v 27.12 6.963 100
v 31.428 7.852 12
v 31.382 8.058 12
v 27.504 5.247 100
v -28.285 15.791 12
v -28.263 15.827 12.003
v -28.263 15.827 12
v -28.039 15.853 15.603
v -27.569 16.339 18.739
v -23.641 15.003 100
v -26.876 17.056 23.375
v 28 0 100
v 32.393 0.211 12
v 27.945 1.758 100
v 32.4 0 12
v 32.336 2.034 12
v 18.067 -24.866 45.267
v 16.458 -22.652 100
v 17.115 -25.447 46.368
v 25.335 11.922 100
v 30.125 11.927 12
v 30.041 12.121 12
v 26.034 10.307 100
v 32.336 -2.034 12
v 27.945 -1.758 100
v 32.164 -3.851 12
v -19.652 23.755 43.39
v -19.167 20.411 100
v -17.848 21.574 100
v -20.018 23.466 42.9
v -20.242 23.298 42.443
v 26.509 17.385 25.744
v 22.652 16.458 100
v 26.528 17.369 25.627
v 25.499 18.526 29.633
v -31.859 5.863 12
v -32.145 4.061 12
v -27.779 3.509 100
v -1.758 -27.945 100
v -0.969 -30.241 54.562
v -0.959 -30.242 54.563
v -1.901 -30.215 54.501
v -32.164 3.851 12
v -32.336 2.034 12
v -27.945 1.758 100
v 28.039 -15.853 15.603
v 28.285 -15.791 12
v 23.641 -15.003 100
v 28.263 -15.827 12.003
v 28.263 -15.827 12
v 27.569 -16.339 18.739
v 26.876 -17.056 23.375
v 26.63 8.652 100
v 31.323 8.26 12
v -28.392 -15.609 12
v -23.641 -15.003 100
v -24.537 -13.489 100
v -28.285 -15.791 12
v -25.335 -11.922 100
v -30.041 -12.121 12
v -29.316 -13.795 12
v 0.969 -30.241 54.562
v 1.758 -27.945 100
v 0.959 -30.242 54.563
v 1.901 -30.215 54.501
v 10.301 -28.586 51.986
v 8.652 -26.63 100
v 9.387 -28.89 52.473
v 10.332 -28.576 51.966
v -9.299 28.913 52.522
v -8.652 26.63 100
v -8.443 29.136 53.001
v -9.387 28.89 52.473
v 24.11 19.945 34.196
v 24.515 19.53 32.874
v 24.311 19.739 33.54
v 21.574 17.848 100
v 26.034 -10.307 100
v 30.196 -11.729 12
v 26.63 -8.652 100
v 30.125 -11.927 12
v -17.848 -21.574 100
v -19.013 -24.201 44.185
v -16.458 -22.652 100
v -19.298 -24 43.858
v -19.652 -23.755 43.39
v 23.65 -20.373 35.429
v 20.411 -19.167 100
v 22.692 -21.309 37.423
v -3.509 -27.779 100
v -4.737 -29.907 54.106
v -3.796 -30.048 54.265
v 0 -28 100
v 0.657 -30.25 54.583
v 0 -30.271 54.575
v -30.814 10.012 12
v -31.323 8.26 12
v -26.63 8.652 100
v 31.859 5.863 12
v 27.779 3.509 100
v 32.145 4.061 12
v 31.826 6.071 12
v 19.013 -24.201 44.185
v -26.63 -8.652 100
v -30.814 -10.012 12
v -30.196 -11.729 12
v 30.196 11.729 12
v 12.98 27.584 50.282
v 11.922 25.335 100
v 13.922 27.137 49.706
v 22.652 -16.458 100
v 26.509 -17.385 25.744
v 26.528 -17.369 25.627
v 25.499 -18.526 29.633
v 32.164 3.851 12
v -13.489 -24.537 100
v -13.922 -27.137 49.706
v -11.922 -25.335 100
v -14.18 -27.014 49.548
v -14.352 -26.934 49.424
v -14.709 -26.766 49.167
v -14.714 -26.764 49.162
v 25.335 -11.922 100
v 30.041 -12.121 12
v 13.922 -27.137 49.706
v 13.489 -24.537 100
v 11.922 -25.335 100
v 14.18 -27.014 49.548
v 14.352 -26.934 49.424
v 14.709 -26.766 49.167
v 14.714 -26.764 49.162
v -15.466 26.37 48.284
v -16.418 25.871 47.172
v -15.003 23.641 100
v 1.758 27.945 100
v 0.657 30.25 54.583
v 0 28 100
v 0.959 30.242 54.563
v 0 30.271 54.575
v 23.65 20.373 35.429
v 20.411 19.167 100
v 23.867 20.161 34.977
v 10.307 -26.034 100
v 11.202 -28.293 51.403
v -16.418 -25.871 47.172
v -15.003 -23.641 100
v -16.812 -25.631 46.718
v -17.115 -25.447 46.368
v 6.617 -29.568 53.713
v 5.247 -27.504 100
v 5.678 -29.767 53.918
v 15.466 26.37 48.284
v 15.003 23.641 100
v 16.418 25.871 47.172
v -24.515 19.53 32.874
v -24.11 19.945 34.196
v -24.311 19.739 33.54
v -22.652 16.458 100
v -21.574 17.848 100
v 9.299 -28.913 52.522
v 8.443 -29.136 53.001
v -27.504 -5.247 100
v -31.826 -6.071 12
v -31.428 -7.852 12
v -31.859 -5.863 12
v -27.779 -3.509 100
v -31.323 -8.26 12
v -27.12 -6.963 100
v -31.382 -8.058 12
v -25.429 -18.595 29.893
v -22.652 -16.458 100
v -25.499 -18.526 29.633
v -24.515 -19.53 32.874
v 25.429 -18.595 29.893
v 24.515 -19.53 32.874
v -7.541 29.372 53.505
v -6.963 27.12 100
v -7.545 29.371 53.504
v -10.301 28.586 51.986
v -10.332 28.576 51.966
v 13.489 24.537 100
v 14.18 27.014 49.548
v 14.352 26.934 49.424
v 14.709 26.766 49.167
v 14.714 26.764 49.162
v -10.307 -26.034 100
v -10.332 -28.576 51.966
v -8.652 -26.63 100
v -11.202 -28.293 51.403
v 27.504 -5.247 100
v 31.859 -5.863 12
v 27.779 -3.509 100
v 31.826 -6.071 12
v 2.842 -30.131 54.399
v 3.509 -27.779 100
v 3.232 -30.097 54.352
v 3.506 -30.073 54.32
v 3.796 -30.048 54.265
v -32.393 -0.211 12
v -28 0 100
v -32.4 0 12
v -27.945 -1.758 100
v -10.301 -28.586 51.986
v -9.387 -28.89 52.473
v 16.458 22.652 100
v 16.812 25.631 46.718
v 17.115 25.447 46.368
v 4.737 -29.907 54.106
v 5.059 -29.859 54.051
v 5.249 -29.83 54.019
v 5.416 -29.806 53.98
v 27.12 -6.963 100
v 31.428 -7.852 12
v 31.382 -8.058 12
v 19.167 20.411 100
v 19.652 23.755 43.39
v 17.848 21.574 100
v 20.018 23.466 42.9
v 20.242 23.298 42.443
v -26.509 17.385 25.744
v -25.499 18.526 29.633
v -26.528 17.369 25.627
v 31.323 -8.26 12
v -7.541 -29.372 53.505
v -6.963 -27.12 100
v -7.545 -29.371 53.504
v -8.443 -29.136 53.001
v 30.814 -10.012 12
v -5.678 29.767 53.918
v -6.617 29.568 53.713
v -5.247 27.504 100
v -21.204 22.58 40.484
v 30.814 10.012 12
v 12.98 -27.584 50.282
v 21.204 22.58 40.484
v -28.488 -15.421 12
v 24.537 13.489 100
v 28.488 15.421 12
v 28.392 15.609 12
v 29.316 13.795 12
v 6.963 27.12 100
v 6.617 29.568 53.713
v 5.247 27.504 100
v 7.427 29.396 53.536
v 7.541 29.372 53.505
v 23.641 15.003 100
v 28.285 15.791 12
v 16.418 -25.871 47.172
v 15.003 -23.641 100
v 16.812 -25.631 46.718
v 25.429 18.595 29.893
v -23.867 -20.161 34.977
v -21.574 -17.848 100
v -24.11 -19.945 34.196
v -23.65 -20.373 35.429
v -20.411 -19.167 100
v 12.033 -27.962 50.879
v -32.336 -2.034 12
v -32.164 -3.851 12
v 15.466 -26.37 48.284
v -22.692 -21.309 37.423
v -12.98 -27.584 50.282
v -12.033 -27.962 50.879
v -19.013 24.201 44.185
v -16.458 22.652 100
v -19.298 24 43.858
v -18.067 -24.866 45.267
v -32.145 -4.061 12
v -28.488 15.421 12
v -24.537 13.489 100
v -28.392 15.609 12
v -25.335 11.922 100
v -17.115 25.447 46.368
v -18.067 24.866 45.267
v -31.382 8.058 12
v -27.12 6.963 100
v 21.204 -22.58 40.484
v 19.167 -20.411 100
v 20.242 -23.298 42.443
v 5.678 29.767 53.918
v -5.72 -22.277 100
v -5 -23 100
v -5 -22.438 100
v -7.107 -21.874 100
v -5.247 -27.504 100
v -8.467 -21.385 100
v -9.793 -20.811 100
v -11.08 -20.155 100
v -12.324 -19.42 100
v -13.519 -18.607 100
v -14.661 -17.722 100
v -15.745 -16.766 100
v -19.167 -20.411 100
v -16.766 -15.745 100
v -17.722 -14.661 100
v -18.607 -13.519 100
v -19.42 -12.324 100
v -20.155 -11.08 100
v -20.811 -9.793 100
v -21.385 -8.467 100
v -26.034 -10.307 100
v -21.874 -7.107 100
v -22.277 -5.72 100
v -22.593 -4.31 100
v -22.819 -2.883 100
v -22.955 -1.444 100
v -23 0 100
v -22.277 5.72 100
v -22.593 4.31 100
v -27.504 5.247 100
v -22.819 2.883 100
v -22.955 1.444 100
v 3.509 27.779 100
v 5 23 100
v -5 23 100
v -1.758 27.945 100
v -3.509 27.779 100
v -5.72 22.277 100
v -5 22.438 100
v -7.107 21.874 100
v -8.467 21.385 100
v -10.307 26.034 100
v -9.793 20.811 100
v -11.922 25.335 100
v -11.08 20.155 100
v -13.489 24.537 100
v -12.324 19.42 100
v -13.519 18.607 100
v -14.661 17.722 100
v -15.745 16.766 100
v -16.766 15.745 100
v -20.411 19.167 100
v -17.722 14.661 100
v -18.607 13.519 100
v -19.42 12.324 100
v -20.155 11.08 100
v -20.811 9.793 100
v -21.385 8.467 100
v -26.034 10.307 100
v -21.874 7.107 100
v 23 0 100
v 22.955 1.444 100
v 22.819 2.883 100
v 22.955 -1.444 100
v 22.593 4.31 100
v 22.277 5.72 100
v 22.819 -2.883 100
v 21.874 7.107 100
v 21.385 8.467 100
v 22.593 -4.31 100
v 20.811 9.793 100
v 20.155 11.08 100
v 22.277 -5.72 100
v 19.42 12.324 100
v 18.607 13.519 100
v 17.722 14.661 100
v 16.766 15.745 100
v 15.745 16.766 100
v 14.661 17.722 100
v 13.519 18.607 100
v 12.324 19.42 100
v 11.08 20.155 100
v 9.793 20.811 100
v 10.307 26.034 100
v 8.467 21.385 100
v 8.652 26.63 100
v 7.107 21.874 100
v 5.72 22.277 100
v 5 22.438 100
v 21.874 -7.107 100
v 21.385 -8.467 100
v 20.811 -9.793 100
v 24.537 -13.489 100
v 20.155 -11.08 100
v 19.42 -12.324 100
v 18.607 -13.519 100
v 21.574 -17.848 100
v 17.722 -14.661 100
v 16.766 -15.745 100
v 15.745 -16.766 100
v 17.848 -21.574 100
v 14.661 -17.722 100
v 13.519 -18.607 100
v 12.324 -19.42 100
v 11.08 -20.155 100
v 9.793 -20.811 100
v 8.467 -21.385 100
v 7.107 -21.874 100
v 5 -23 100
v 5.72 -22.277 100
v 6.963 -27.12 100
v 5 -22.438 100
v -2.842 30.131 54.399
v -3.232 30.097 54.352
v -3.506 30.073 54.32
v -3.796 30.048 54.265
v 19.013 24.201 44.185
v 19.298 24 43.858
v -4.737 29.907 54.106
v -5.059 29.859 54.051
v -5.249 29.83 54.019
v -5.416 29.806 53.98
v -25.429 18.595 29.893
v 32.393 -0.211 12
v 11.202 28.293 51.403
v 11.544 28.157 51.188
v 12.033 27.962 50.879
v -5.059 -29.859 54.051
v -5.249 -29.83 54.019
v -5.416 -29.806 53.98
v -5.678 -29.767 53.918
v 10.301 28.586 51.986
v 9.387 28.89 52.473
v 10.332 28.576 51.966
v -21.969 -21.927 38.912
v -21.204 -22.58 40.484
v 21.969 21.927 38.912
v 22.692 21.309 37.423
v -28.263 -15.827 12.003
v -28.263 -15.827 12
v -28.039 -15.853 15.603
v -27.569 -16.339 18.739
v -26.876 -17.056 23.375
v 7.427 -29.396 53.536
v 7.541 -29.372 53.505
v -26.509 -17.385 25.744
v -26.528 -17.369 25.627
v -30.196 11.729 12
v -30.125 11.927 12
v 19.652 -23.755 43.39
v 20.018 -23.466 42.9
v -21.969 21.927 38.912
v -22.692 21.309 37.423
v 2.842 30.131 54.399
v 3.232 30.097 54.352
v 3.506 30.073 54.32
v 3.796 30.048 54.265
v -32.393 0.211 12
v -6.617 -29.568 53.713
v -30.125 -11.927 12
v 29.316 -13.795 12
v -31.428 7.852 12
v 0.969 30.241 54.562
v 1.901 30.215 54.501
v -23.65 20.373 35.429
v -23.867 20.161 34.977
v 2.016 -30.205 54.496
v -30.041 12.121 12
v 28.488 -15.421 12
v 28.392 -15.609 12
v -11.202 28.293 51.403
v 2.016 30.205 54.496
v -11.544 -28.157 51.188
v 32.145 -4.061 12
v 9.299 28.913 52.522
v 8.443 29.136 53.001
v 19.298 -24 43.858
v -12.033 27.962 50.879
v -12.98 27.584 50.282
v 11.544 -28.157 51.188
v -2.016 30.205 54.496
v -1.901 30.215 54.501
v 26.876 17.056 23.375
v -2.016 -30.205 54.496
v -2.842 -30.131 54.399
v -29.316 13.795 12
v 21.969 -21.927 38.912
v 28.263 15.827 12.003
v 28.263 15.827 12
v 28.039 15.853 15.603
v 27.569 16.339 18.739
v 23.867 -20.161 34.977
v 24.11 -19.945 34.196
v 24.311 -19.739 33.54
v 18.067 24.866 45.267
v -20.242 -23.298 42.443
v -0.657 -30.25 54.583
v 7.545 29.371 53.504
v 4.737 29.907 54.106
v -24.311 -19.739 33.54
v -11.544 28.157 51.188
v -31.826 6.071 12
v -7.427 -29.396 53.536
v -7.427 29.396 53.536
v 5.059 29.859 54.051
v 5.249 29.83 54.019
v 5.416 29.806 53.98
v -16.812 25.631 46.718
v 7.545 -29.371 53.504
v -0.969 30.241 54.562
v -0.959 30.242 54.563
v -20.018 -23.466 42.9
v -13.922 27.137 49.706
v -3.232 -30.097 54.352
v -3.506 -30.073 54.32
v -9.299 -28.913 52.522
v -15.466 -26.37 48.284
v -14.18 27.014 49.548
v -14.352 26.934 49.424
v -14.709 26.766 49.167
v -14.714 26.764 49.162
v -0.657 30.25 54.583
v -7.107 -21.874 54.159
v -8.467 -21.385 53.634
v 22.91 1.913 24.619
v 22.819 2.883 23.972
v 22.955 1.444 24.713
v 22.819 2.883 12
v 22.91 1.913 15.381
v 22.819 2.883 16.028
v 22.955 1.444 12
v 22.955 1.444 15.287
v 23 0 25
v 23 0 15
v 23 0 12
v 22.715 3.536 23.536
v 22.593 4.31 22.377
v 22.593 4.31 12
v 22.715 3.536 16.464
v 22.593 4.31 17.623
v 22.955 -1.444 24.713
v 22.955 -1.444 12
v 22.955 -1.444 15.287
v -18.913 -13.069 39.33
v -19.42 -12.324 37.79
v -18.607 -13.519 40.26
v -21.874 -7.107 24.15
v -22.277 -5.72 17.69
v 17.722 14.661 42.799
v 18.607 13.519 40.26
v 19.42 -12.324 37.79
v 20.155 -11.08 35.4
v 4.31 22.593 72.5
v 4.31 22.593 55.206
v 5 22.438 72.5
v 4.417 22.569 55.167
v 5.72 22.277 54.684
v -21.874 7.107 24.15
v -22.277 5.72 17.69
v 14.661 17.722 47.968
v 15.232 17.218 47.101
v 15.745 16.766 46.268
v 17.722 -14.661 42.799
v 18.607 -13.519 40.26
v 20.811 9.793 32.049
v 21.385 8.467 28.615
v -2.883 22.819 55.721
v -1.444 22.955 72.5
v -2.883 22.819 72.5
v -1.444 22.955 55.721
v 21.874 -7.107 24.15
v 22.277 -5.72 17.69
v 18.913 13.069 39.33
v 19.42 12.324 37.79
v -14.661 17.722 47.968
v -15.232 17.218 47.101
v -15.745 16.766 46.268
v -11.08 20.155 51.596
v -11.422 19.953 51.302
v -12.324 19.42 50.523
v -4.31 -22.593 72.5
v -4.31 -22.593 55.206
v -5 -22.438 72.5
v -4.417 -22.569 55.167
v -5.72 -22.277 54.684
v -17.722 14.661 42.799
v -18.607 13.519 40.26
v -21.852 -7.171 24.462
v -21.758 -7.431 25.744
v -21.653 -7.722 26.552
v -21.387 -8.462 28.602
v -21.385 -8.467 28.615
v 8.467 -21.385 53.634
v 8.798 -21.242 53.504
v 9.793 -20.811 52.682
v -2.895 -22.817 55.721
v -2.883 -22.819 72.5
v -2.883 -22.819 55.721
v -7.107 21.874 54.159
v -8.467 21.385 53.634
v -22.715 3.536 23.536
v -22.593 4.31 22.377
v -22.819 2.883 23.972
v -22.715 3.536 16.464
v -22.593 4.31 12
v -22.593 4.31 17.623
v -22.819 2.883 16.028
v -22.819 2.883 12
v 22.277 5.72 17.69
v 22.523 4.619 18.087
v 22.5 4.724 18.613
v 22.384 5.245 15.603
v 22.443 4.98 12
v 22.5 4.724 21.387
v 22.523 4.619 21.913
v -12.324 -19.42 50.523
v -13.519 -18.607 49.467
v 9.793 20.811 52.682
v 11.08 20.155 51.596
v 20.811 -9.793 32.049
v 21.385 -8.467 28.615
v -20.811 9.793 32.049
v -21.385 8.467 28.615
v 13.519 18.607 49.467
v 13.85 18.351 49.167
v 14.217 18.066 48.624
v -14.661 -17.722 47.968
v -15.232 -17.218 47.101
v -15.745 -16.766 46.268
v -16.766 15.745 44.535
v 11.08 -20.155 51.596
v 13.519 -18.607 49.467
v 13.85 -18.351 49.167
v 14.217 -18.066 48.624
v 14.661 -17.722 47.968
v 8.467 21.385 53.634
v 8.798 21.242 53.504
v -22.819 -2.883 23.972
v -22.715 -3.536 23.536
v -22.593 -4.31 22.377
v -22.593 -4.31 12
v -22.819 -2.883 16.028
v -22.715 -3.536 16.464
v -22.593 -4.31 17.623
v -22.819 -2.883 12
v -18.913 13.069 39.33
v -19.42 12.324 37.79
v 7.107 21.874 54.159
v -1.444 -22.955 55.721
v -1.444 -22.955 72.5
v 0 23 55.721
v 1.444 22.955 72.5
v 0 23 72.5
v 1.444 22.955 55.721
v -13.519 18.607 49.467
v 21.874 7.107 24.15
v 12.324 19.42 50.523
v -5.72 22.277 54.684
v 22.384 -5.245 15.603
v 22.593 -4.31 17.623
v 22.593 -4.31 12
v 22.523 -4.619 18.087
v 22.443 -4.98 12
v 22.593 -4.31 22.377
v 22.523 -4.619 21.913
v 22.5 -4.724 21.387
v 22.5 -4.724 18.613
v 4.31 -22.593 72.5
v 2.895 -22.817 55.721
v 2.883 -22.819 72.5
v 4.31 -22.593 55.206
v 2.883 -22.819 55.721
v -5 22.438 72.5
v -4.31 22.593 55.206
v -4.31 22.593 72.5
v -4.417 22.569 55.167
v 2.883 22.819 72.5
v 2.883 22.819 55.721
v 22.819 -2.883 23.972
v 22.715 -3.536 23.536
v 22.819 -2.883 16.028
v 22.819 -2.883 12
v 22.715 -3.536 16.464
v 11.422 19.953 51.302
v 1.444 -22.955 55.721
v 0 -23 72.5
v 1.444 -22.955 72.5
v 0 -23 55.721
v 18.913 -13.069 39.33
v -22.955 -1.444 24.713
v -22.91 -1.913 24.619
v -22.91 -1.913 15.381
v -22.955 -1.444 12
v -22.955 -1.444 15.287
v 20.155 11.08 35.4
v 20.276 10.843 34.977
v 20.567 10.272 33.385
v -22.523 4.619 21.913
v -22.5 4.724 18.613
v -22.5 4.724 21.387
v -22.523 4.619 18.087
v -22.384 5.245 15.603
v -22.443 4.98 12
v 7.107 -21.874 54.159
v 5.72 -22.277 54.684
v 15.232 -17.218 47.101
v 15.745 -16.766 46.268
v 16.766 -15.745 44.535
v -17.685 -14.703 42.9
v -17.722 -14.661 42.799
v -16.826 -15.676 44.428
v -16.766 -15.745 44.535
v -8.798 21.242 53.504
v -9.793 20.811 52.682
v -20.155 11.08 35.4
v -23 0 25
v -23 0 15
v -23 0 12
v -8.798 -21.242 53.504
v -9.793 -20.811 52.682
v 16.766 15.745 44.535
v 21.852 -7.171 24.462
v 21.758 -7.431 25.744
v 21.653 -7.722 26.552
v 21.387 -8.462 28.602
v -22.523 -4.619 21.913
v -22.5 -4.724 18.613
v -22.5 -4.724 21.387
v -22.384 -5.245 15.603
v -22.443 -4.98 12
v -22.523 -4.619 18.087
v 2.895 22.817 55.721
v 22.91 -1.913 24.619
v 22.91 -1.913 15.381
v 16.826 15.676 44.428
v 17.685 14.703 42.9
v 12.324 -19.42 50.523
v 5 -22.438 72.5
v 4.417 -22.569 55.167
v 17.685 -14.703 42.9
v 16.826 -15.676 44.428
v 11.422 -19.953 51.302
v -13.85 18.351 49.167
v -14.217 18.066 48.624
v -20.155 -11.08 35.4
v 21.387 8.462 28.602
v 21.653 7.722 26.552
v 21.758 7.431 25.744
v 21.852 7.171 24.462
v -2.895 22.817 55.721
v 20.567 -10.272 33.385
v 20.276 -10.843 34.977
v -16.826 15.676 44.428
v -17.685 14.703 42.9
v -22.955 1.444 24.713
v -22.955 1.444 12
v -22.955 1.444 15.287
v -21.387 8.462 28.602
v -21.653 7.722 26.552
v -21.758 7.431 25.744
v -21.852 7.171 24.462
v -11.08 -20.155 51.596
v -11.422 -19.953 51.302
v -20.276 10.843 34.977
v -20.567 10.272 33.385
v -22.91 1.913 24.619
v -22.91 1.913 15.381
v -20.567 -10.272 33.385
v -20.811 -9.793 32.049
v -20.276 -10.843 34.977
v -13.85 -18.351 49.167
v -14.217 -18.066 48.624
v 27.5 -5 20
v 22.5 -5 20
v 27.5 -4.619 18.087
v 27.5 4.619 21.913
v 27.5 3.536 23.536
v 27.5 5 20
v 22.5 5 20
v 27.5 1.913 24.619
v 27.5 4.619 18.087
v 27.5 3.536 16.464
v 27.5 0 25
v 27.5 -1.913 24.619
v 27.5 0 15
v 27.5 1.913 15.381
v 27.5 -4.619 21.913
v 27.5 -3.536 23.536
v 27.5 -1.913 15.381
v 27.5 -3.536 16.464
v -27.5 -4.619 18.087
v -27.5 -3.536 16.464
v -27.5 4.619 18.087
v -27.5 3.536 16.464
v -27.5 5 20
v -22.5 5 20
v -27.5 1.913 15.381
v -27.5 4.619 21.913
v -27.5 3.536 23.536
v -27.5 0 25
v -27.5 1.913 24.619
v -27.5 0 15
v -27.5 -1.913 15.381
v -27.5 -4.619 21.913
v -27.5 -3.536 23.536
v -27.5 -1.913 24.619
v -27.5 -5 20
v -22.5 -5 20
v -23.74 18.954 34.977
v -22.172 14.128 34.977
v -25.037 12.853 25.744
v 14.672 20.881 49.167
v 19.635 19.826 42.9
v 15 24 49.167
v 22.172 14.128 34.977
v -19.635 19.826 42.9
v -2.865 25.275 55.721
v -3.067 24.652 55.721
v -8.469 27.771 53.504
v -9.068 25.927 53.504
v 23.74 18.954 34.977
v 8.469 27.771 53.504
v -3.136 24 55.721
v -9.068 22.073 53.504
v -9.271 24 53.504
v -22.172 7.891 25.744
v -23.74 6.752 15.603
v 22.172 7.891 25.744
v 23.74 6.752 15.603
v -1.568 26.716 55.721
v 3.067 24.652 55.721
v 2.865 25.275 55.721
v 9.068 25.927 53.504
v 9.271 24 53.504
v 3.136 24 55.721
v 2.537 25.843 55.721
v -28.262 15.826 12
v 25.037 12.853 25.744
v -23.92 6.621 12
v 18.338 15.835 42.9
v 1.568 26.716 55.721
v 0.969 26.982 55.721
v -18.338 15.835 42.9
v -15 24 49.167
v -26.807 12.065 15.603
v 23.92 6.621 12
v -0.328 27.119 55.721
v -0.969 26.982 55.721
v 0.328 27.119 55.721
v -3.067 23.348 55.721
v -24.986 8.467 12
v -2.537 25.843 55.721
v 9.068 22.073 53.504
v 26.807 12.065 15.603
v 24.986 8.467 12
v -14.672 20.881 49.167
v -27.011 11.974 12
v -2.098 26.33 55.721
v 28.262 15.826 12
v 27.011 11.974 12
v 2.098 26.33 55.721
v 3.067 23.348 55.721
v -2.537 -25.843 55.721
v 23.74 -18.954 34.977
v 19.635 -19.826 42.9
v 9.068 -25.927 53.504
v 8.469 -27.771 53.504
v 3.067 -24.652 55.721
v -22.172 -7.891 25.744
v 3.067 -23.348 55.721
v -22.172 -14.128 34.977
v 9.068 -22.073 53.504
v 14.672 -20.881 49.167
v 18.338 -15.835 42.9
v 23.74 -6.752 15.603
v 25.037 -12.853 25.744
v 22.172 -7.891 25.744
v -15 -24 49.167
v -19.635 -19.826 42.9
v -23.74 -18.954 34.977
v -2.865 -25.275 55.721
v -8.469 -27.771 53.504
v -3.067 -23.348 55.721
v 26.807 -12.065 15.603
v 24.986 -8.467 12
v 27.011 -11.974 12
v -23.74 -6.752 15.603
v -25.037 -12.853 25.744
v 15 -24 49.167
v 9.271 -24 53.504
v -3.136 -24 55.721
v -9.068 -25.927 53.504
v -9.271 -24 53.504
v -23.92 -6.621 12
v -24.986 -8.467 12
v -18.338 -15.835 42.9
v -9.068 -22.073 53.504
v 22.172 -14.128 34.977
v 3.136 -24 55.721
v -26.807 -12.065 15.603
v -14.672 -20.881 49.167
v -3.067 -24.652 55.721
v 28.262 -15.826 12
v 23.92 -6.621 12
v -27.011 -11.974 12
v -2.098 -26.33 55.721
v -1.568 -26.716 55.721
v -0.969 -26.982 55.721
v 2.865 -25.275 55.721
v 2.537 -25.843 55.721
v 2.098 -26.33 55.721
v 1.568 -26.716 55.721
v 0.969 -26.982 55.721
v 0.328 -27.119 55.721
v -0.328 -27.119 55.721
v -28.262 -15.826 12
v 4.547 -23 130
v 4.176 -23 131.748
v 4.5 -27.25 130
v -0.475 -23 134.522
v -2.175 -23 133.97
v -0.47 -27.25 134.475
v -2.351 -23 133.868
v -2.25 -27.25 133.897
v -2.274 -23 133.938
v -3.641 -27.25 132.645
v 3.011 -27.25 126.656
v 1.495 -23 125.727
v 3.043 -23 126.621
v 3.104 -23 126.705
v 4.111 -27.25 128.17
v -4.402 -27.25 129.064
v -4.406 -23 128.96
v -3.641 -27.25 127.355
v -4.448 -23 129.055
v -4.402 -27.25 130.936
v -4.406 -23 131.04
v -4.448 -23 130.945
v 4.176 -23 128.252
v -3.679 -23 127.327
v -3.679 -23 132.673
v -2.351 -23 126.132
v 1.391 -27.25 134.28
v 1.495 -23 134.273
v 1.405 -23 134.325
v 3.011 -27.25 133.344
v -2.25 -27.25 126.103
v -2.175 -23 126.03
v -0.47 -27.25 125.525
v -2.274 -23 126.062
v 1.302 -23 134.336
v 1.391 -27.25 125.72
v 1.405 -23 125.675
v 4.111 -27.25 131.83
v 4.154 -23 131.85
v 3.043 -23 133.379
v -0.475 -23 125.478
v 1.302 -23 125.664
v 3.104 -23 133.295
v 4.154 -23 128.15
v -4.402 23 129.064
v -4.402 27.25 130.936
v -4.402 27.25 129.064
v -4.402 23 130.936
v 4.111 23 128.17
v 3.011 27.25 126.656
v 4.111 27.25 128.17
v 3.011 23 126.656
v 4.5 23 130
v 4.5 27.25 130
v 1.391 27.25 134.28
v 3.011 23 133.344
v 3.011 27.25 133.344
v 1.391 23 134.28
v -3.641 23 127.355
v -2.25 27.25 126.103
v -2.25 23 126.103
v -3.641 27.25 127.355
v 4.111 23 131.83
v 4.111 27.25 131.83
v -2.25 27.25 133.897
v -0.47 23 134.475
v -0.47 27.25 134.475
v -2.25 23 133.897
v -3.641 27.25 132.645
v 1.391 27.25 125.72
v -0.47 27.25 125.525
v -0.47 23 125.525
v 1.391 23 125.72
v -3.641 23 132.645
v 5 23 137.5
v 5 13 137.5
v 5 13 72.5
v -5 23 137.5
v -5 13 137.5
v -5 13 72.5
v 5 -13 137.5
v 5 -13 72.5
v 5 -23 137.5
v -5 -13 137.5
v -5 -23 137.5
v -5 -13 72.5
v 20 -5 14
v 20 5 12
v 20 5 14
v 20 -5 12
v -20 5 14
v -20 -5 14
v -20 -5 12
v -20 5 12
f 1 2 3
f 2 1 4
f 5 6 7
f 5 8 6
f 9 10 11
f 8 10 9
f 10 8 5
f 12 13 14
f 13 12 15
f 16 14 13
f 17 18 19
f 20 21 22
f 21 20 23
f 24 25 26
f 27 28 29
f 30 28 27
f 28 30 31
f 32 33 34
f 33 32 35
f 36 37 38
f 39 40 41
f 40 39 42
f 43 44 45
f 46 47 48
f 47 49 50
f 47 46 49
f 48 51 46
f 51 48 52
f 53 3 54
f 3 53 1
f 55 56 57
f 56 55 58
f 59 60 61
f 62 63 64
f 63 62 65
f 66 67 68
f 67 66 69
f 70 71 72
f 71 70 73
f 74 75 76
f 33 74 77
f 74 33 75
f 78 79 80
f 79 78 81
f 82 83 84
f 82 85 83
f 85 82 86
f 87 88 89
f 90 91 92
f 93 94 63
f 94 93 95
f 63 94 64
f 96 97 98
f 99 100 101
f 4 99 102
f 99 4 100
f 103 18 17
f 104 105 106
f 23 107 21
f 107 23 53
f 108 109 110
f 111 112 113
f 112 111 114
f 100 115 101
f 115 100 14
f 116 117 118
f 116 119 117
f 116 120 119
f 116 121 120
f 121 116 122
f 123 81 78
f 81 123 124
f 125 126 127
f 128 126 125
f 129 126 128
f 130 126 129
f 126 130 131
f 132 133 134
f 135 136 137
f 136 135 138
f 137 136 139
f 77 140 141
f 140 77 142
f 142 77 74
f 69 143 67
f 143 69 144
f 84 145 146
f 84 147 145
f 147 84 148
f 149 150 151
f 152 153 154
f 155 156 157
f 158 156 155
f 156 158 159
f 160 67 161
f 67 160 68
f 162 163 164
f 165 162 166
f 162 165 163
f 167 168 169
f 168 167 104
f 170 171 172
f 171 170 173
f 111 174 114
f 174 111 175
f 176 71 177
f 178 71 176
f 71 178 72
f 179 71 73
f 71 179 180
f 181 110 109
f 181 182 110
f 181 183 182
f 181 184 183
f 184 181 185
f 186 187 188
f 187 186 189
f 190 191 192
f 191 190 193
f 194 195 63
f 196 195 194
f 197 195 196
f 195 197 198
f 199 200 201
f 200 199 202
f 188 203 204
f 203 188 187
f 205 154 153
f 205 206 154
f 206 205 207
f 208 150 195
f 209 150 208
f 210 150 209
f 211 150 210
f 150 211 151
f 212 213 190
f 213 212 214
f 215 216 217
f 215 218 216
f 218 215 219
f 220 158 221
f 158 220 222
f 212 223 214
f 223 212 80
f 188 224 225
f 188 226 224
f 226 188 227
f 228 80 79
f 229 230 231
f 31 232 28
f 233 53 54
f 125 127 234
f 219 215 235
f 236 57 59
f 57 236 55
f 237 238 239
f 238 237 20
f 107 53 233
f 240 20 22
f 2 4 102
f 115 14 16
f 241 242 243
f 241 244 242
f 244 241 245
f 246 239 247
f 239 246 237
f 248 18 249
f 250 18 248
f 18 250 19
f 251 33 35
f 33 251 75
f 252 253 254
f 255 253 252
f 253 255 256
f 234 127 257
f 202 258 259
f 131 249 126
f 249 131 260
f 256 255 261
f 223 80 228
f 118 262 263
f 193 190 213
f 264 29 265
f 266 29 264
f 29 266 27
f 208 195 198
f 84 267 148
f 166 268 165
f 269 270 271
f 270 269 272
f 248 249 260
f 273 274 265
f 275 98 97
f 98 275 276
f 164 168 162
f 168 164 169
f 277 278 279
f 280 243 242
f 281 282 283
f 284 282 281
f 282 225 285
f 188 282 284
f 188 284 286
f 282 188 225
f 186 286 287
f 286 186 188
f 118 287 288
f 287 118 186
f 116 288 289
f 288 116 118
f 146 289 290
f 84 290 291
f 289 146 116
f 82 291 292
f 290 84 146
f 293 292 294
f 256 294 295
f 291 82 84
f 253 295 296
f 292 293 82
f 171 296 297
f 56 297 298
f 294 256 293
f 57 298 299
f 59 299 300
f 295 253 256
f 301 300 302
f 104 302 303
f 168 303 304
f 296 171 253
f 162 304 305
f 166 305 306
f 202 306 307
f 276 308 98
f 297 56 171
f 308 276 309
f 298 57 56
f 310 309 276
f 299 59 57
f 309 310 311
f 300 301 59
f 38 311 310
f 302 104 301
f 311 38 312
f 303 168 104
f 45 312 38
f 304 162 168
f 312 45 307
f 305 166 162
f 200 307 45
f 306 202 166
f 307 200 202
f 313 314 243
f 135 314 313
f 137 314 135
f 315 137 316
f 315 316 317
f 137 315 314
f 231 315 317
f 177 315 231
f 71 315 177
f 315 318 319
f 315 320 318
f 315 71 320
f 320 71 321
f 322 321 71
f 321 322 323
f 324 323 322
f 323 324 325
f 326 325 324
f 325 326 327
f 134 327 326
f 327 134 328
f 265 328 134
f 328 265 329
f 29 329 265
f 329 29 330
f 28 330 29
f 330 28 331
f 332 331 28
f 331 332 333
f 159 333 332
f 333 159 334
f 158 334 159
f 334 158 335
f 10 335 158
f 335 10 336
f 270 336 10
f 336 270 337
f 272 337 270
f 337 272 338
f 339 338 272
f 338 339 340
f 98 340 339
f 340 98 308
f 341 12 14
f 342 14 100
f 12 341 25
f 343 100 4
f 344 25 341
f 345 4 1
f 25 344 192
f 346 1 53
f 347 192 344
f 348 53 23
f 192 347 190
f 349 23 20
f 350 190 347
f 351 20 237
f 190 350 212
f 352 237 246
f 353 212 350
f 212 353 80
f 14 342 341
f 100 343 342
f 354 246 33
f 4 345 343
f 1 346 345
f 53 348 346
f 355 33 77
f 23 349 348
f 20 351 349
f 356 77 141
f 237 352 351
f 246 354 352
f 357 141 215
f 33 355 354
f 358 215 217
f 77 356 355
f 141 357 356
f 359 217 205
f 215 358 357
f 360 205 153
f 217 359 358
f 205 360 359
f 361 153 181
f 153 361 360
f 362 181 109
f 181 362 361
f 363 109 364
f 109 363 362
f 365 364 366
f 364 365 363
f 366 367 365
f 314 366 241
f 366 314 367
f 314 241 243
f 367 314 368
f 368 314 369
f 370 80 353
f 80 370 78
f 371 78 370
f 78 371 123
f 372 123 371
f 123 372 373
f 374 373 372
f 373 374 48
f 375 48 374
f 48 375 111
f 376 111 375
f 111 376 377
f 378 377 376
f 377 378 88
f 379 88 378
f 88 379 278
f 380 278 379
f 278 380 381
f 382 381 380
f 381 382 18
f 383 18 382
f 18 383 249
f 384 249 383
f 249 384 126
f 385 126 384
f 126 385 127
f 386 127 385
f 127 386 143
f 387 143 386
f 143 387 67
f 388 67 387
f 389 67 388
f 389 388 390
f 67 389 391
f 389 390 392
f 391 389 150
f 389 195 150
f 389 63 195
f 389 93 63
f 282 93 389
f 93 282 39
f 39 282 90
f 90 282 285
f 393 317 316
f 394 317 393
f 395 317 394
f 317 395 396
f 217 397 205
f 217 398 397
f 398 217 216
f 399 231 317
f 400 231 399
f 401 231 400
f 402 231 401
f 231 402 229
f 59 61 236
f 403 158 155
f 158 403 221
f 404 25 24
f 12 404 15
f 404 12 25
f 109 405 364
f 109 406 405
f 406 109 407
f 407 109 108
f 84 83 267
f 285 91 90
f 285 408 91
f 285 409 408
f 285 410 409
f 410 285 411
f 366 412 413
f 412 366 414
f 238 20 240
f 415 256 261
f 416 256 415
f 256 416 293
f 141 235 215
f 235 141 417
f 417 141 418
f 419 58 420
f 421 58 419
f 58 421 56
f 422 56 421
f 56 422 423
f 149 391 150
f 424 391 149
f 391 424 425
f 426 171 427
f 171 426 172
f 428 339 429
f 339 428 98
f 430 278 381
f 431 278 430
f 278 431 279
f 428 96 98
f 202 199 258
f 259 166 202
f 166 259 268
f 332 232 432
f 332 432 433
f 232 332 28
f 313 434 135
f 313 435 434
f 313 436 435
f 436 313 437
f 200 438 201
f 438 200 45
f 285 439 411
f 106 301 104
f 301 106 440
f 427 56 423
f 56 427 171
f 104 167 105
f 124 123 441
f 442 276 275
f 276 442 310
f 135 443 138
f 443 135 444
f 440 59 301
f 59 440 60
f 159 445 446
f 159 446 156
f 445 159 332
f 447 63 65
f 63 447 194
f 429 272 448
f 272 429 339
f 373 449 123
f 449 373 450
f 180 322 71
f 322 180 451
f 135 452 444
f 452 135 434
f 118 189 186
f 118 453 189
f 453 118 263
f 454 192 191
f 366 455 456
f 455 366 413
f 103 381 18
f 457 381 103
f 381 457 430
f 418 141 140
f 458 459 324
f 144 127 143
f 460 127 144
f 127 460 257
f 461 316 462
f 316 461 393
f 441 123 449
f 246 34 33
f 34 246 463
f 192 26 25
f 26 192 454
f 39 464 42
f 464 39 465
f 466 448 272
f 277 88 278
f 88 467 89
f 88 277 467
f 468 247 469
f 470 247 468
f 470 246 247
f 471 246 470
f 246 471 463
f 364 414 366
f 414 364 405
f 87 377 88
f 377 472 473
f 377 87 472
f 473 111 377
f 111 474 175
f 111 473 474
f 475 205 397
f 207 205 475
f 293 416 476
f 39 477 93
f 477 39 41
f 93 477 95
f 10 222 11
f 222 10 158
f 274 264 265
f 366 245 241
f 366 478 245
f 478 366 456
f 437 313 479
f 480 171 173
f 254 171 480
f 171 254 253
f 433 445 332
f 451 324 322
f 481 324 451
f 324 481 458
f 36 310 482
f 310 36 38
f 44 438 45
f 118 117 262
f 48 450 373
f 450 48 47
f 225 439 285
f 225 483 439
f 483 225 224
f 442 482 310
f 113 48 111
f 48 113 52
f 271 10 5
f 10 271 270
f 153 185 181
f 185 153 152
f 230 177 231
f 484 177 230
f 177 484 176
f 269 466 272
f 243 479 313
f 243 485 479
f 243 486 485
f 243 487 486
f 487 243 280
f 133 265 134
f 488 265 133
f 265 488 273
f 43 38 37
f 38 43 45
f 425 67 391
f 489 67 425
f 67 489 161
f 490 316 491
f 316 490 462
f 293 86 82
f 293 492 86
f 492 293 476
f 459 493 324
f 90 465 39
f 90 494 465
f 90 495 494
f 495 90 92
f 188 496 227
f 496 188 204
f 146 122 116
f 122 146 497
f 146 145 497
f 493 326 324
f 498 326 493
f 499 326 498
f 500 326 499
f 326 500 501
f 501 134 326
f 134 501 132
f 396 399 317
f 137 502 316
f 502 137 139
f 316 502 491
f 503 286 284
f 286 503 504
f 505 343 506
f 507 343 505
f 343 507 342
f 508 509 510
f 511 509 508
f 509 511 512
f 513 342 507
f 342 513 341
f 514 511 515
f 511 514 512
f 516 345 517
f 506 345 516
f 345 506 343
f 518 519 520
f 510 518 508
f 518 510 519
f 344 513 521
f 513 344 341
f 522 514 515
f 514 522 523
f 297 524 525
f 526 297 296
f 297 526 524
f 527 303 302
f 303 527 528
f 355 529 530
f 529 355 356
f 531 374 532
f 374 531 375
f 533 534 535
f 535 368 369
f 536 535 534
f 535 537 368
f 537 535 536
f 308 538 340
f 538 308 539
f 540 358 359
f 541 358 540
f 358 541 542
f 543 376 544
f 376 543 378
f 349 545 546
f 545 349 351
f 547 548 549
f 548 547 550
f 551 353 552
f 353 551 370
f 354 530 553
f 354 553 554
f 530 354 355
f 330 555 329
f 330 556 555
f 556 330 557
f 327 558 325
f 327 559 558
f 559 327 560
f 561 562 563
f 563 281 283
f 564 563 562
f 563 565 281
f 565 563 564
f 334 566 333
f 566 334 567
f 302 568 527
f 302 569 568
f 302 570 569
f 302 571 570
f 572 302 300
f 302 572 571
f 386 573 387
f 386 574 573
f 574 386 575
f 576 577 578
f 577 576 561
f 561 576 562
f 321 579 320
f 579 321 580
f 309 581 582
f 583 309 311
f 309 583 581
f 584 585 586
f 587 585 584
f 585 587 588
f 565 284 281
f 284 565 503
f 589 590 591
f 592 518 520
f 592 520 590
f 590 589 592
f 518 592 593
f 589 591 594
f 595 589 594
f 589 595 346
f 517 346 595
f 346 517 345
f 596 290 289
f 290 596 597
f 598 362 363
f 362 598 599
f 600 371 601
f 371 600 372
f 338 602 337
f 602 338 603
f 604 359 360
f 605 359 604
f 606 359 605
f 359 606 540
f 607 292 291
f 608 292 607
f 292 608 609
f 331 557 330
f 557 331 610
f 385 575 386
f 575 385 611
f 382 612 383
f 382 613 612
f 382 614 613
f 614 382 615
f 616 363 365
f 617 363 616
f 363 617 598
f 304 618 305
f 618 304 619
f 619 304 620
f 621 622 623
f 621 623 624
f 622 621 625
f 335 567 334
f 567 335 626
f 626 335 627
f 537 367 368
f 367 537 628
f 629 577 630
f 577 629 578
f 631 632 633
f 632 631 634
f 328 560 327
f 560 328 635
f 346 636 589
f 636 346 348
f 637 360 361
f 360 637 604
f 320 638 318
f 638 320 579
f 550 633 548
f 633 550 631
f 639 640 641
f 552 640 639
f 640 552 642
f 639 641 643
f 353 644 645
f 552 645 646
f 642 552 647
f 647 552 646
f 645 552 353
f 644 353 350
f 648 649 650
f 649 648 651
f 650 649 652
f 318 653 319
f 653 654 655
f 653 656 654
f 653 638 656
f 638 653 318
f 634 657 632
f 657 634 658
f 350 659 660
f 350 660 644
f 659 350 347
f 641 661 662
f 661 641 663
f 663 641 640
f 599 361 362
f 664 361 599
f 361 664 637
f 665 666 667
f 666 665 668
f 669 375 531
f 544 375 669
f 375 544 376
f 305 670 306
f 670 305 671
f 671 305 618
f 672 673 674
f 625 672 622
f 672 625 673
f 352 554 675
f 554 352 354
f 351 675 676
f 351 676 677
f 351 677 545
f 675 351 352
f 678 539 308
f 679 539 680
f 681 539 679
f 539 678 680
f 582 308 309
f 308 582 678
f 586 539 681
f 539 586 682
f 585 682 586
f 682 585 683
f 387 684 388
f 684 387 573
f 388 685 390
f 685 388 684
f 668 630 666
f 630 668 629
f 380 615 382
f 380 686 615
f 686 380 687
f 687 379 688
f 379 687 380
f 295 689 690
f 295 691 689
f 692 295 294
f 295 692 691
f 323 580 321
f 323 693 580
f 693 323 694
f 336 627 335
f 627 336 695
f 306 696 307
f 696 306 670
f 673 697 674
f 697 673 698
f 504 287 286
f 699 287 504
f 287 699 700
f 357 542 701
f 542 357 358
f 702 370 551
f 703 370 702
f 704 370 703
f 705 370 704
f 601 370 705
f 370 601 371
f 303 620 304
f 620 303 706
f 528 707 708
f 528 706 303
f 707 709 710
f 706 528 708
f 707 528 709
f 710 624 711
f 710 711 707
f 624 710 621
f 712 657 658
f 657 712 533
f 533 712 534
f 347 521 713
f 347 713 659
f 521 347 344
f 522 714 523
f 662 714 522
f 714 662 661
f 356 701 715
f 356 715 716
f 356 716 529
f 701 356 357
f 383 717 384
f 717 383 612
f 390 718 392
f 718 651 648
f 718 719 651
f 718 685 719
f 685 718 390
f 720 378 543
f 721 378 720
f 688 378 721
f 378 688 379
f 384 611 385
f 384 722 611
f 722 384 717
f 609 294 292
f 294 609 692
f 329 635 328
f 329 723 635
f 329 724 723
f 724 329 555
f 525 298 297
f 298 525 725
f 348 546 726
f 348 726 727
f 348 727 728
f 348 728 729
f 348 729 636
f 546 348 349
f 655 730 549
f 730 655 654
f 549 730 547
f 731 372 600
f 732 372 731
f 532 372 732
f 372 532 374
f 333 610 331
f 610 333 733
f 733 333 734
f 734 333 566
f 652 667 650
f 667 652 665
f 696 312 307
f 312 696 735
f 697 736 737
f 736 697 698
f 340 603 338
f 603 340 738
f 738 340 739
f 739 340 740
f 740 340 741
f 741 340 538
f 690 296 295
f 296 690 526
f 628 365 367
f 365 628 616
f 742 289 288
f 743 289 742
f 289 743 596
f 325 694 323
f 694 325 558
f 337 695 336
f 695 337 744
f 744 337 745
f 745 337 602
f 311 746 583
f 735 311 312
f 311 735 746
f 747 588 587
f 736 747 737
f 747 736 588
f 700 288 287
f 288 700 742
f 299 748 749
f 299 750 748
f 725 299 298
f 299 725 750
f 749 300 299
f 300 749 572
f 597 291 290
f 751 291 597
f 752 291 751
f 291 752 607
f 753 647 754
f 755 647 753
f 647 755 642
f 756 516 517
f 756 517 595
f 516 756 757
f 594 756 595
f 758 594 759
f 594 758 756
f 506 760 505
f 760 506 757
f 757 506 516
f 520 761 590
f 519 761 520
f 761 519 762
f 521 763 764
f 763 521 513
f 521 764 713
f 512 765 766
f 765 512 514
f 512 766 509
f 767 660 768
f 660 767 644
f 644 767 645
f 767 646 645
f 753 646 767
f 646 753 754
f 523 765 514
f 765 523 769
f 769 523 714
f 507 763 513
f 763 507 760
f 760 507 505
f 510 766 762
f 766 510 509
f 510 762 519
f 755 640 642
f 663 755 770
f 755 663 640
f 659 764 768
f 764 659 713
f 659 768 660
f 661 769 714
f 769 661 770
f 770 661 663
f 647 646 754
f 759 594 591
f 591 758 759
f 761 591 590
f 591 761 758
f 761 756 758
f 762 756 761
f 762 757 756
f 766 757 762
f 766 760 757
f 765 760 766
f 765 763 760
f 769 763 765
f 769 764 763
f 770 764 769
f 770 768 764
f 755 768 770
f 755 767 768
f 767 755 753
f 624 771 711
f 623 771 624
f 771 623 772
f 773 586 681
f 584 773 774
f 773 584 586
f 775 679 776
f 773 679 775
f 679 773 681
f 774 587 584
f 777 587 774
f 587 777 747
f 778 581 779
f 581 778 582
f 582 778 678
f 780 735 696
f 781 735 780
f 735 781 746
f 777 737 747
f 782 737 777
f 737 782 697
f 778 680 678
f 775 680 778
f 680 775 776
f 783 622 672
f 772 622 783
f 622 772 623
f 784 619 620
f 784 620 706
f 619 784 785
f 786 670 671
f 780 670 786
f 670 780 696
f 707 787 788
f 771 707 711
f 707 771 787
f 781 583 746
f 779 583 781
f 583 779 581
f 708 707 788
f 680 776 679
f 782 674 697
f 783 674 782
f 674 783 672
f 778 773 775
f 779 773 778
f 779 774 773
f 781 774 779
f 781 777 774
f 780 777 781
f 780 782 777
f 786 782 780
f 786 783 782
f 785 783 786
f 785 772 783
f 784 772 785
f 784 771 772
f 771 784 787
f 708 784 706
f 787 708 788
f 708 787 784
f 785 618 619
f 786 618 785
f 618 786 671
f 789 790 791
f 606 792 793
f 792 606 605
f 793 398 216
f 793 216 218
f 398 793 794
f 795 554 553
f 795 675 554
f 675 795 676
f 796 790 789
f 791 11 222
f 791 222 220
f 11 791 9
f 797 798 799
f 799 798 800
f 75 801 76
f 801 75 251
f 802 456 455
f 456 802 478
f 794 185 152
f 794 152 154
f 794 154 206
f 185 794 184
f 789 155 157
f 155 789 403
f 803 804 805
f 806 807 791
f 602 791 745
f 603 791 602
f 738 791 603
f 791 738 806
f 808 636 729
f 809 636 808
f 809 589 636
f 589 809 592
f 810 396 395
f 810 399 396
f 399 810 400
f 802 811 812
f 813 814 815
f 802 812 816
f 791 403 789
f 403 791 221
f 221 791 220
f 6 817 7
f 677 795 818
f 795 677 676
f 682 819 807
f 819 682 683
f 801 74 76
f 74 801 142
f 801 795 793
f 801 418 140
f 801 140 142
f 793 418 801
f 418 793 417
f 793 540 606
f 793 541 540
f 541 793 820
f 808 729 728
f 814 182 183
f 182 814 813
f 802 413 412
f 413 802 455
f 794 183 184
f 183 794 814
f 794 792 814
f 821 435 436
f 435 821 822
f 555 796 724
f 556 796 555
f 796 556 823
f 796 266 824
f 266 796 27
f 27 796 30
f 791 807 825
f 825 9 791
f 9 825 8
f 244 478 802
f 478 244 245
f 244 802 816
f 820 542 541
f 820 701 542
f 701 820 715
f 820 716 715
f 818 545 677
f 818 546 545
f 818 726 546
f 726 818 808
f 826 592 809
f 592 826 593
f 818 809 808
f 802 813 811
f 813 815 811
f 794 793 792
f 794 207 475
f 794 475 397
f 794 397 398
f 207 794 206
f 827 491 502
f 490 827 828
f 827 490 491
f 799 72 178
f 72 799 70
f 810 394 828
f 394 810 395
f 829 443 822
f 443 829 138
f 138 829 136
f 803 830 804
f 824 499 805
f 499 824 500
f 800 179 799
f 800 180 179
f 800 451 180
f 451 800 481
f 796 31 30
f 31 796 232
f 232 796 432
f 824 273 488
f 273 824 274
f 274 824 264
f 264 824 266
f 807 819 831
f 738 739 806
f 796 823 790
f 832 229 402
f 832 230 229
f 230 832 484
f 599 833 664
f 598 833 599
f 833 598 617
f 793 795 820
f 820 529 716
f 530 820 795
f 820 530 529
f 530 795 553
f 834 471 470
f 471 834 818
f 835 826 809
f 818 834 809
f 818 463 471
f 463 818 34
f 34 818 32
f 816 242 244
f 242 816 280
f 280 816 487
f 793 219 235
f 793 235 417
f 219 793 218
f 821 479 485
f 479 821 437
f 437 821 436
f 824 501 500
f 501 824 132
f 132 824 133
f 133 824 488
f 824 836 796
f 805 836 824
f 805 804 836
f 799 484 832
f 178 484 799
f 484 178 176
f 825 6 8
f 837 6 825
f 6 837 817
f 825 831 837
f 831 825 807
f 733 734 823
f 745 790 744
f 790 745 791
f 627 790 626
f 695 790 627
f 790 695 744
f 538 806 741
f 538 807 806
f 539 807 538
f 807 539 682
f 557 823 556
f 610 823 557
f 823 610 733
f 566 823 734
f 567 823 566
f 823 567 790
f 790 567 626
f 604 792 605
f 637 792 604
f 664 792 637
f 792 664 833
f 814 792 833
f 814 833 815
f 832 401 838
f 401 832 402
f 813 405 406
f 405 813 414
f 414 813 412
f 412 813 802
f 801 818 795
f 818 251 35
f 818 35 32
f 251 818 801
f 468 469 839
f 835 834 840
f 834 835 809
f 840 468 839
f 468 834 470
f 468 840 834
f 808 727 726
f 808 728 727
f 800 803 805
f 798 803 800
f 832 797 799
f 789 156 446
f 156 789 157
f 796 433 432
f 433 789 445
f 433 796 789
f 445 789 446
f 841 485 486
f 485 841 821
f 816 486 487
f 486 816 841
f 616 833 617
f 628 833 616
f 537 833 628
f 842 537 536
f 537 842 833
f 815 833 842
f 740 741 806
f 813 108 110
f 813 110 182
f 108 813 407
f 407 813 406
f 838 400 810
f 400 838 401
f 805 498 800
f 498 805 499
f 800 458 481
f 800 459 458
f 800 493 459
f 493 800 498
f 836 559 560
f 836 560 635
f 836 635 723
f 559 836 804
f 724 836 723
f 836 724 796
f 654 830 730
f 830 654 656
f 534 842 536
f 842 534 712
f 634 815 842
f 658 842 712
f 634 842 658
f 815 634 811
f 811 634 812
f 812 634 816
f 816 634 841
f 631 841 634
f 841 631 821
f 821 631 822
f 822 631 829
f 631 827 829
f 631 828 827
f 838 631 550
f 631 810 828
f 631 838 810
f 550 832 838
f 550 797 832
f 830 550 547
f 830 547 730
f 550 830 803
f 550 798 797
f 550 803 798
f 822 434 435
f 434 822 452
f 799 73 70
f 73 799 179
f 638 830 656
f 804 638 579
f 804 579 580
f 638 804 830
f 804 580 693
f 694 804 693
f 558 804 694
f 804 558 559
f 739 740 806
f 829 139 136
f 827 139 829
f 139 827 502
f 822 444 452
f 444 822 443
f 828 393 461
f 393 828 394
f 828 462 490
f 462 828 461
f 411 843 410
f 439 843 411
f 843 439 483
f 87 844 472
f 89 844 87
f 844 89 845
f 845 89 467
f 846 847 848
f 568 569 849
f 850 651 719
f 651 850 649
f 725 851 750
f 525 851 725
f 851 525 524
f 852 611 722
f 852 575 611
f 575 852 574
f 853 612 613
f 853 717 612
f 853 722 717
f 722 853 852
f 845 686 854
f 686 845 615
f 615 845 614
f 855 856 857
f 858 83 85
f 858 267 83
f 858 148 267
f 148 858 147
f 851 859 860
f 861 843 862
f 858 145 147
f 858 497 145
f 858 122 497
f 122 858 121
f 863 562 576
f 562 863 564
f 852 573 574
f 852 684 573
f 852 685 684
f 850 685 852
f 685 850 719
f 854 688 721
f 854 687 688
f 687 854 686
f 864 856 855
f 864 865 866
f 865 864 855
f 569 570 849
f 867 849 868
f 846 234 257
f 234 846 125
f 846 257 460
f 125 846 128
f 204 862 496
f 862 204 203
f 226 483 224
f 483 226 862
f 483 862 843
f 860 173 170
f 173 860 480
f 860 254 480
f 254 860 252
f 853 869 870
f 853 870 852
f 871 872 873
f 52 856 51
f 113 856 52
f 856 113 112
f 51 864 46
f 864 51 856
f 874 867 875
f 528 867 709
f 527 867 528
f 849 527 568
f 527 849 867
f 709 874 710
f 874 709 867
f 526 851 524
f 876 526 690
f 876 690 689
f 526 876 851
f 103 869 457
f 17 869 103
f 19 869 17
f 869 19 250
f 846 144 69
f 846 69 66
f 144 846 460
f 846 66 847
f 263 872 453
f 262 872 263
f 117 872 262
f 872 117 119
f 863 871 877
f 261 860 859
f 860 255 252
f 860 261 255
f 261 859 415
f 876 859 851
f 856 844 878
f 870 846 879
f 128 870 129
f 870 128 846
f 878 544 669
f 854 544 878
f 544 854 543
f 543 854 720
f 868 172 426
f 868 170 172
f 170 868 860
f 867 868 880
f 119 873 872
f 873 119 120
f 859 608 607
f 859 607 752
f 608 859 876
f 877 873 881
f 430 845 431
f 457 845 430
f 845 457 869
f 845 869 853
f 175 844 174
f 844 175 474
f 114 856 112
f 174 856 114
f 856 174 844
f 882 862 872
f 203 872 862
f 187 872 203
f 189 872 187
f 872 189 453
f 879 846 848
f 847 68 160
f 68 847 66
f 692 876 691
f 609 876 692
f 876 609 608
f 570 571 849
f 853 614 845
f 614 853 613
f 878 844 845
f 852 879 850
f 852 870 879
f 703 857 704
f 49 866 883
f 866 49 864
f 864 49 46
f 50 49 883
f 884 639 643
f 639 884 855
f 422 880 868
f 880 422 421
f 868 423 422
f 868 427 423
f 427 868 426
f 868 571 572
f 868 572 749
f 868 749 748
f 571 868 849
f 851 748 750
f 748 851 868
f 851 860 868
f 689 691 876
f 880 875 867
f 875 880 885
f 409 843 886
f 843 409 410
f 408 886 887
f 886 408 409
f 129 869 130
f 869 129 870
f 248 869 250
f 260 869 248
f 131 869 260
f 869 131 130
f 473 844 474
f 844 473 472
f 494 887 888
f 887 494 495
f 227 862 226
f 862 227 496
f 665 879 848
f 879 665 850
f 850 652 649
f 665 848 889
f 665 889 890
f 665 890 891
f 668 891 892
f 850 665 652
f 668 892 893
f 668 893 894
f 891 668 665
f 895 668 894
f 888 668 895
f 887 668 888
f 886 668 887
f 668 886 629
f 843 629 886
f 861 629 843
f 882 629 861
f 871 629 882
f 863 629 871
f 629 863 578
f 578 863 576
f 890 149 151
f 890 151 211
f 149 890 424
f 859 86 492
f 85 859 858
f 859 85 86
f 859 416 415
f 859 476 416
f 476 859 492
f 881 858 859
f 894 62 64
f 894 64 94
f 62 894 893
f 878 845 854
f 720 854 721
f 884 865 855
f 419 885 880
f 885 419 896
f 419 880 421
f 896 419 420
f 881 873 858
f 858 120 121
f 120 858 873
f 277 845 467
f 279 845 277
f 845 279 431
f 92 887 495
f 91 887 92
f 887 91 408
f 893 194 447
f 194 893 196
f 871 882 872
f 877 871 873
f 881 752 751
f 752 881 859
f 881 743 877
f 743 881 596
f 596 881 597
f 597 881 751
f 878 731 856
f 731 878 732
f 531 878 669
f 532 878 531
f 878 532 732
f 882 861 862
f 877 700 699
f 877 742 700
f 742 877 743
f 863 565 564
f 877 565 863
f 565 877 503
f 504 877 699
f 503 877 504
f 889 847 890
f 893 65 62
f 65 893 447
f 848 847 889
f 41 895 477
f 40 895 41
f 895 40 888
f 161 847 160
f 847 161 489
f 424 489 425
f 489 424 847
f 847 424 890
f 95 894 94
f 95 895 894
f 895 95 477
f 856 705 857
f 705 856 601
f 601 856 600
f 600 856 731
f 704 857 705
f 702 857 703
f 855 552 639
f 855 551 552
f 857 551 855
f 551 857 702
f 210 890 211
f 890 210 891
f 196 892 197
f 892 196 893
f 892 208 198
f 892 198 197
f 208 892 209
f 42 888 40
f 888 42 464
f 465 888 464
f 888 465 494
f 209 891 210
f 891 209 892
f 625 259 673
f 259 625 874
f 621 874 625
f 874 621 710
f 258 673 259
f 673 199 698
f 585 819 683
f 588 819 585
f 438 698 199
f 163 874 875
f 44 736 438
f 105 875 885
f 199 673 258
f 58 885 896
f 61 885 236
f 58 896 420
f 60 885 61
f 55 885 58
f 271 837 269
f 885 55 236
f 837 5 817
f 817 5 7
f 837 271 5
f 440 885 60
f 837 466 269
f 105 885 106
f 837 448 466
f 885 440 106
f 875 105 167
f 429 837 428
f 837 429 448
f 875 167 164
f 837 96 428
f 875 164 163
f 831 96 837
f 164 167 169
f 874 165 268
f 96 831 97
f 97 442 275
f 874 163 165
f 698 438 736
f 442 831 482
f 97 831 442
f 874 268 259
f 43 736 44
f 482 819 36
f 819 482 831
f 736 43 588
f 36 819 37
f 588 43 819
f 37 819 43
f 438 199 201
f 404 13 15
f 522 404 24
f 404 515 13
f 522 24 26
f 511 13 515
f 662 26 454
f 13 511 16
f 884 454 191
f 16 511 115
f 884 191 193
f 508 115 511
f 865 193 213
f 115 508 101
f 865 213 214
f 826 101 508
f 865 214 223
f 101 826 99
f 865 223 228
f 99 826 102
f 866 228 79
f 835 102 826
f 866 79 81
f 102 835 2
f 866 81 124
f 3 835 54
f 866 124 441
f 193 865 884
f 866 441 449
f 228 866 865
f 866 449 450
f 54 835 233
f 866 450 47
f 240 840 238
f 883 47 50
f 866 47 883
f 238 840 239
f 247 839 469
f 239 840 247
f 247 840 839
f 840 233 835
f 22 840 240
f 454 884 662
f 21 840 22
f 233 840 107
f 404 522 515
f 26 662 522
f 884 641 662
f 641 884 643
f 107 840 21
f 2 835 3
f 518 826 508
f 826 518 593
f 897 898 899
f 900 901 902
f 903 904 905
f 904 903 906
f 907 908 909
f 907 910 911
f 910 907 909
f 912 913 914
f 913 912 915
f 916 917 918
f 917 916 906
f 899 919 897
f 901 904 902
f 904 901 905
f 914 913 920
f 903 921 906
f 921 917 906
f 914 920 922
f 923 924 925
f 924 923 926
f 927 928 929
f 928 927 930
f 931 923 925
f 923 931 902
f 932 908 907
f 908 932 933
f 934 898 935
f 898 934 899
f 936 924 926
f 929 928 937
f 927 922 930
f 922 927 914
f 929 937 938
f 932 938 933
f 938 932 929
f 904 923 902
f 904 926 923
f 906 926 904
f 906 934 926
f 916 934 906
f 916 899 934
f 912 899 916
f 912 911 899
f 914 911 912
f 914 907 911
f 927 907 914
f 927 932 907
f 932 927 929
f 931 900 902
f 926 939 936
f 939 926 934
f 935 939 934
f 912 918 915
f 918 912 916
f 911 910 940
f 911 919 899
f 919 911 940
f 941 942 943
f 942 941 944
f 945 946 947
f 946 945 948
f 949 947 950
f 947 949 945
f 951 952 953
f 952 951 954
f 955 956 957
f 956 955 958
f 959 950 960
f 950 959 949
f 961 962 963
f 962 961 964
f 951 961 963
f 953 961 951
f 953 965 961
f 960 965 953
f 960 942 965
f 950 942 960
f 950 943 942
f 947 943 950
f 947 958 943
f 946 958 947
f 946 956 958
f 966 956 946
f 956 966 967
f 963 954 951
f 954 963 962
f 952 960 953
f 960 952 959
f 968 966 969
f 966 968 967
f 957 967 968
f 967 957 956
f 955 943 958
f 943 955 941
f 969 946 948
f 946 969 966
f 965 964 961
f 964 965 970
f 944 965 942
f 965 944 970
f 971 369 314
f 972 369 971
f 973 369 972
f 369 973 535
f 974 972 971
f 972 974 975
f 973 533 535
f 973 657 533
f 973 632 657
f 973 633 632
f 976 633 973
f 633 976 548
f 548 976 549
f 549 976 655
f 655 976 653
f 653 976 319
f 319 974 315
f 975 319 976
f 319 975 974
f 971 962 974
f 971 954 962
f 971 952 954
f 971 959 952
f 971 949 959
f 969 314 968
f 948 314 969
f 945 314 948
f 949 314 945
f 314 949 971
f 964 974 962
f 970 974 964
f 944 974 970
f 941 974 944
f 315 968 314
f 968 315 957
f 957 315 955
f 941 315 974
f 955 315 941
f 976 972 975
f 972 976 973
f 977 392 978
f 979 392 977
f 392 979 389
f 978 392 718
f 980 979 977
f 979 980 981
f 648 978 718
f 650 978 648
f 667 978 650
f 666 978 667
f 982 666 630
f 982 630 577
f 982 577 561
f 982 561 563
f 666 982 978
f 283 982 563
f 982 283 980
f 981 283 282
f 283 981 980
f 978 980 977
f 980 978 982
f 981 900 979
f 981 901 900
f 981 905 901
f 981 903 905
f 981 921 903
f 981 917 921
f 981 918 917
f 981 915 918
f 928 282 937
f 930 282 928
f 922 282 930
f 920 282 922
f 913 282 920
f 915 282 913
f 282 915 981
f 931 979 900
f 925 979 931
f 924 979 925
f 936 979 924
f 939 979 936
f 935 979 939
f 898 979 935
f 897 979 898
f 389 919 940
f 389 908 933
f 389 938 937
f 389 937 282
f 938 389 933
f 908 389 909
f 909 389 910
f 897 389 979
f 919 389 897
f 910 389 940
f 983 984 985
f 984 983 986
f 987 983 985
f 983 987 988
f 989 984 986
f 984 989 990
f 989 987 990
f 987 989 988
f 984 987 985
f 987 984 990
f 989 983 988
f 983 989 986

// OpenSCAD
translate( [-20,-5,12] ) {
	cube( [40,10,2] );
}


union() {
	// Connectors
	translate( [0, -25, 130] ) {
		rotate( 90, [1,0,0] ) {
			cylinder( 4.5, 4.55, 4.5, center=true );
		}
	}
	translate( [0, 25, 130] ) {
		rotate( 90, [-1,0,0] ) {
			cylinder( 4.5, 4.5, 4.5, center=true );
		}
	}
	translate( [0, 18.0, 105] ) {
		cube( [10,10,65], center=true );
	}
	translate( [0, -18.0, 105] ) {
		cube( [10,10,65], center=true );
	}

	difference() {
		difference() {
			difference() {
				difference() {
					cylinder(h=100,r1=33,r2=28, $fn=100);
					translate([0,0,-1]) cylinder(h=110,r=23,$fn=100);
				}
		
				// Indents
				rotate( 90, [0,0,1] ) {
					translate( [0, -25, 20] ) {
						rotate( 90, [1,0,0] ) {
							cylinder( 5, 5, 5, center=true );
						}
					}
					translate( [0, 25, 20] ) {
						rotate( 90, [-1,0,0] ) {
							cylinder( 5, 5, 5, center=true );
						}
					}
				}
			}
			translate( [0,24,5] ) {
				scale( [1,1,1.7] )
				sphere( 30 );
			}
			translate( [0,-24,5] ) {
				scale( [1,1,1.7] )
				sphere( 30 );
			}
		}
		translate( [0,0,-38] ) {
			cube( [100,100,100],center=true );
		}
	}
}
